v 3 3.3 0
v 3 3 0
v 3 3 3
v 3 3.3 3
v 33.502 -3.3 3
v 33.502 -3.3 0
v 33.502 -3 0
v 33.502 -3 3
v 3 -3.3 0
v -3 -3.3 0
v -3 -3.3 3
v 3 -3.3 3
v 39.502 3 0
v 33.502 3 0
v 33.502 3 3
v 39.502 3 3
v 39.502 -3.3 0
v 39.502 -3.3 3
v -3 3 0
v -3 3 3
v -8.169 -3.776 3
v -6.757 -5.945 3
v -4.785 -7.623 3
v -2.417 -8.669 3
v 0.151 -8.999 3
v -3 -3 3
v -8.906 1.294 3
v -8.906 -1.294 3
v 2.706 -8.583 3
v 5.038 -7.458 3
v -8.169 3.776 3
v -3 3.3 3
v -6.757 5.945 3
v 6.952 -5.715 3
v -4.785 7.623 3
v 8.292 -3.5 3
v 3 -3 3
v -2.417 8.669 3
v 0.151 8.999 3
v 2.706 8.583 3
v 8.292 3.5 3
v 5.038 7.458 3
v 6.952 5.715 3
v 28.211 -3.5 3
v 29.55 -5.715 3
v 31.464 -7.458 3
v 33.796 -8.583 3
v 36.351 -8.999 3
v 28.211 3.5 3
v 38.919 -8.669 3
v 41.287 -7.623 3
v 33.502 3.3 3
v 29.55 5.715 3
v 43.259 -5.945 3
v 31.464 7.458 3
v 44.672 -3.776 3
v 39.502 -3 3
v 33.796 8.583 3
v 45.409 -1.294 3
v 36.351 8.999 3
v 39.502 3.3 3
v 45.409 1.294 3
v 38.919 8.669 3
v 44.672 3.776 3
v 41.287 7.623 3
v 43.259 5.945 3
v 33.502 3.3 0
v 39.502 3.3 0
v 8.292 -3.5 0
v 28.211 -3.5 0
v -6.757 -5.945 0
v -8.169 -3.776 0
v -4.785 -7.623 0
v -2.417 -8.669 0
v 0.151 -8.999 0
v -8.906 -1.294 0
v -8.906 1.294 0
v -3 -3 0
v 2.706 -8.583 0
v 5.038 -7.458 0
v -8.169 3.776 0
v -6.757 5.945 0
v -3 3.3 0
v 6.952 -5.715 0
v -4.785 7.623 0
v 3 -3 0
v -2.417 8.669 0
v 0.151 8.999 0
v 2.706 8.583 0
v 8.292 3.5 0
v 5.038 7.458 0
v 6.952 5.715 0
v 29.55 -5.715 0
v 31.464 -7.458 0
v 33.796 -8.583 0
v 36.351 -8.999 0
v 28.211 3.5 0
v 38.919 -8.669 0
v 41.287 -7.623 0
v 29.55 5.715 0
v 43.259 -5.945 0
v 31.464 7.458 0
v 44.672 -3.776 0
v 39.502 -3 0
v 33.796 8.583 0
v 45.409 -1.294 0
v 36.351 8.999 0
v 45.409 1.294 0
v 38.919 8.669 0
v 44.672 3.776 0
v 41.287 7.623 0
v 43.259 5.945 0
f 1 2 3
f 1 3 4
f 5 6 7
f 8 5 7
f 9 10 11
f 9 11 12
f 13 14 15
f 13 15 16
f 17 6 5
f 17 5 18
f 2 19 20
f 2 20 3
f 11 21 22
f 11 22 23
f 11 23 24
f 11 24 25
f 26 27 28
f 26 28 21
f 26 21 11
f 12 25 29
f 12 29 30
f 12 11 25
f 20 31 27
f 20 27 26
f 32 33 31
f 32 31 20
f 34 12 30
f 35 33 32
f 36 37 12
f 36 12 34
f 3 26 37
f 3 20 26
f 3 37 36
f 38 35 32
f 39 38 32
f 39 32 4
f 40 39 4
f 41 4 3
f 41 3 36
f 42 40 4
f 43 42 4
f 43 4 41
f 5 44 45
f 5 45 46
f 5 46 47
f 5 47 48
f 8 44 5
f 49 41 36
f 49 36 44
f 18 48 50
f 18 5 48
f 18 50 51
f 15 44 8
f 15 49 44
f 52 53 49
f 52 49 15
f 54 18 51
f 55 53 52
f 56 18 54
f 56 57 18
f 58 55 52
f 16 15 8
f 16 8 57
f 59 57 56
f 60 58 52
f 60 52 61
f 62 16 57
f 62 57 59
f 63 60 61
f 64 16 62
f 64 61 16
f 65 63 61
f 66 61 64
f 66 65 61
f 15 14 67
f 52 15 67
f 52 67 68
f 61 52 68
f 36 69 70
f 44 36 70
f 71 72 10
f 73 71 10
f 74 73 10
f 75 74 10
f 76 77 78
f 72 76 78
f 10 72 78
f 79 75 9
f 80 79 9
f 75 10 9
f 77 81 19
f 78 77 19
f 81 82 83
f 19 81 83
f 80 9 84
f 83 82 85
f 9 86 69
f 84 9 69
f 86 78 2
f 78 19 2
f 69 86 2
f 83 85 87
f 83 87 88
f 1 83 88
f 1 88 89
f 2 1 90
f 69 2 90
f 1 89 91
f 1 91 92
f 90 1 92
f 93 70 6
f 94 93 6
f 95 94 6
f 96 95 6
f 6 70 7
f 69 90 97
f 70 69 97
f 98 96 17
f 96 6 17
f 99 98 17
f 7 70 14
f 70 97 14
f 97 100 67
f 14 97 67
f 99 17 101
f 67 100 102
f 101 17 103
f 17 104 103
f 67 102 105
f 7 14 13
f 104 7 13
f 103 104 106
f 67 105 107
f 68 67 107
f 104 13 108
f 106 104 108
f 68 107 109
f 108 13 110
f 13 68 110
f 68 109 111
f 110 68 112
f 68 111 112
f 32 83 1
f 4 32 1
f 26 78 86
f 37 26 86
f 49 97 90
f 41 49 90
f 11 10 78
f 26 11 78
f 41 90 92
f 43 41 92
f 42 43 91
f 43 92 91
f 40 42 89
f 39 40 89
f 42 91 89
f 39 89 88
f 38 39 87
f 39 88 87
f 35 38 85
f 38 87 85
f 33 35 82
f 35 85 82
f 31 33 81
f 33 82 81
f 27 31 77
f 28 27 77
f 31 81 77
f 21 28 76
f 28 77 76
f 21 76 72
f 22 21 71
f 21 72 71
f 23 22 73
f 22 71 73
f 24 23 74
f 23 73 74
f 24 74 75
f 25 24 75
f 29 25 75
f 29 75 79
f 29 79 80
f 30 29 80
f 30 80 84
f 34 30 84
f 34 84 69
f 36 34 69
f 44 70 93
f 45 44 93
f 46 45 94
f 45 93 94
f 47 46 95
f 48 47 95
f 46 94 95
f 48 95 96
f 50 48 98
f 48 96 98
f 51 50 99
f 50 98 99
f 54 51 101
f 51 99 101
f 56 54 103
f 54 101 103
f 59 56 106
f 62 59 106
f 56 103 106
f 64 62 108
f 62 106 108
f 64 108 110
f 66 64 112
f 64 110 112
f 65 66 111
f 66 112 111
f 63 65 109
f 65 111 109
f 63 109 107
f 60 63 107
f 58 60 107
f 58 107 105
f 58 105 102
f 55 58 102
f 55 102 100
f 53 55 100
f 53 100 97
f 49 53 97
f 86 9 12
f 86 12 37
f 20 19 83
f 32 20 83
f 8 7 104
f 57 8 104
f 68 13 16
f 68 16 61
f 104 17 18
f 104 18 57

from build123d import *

# Parameters (mm, degrees)
F0_W     = 6
F0_H     = 0.3
F1_DEPTH = 3


with BuildPart() as f1:
    # F0 (on Top) → F1 (new body)
    with BuildSketch(Plane.XY):
        with BuildLine():
            Line((28.210546, 3.5), (8.291562, 3.5))
            ThreePointArc((8.291562, 3.5), (-9, 0), (8.291562, -3.5))
            Line((8.291562, -3.5), (28.210546, -3.5))
            ThreePointArc((28.210546, -3.5), (45.502108, 0), (28.210546, 3.5))
        make_face()
        with Locations((0, -3.15)):
            Rectangle(F0_W, F0_H, mode=Mode.SUBTRACT)
        with Locations((36.502108, -3.15)):
            Rectangle(F0_W, F0_H, mode=Mode.SUBTRACT)
        with Locations((0, 3.15)):
            Rectangle(F0_W, F0_H, mode=Mode.SUBTRACT)
        with Locations((36.502108, 3.15)):
            Rectangle(F0_W, F0_H, mode=Mode.SUBTRACT)
    extrude(amount=F1_DEPTH)


solid = f1.part
